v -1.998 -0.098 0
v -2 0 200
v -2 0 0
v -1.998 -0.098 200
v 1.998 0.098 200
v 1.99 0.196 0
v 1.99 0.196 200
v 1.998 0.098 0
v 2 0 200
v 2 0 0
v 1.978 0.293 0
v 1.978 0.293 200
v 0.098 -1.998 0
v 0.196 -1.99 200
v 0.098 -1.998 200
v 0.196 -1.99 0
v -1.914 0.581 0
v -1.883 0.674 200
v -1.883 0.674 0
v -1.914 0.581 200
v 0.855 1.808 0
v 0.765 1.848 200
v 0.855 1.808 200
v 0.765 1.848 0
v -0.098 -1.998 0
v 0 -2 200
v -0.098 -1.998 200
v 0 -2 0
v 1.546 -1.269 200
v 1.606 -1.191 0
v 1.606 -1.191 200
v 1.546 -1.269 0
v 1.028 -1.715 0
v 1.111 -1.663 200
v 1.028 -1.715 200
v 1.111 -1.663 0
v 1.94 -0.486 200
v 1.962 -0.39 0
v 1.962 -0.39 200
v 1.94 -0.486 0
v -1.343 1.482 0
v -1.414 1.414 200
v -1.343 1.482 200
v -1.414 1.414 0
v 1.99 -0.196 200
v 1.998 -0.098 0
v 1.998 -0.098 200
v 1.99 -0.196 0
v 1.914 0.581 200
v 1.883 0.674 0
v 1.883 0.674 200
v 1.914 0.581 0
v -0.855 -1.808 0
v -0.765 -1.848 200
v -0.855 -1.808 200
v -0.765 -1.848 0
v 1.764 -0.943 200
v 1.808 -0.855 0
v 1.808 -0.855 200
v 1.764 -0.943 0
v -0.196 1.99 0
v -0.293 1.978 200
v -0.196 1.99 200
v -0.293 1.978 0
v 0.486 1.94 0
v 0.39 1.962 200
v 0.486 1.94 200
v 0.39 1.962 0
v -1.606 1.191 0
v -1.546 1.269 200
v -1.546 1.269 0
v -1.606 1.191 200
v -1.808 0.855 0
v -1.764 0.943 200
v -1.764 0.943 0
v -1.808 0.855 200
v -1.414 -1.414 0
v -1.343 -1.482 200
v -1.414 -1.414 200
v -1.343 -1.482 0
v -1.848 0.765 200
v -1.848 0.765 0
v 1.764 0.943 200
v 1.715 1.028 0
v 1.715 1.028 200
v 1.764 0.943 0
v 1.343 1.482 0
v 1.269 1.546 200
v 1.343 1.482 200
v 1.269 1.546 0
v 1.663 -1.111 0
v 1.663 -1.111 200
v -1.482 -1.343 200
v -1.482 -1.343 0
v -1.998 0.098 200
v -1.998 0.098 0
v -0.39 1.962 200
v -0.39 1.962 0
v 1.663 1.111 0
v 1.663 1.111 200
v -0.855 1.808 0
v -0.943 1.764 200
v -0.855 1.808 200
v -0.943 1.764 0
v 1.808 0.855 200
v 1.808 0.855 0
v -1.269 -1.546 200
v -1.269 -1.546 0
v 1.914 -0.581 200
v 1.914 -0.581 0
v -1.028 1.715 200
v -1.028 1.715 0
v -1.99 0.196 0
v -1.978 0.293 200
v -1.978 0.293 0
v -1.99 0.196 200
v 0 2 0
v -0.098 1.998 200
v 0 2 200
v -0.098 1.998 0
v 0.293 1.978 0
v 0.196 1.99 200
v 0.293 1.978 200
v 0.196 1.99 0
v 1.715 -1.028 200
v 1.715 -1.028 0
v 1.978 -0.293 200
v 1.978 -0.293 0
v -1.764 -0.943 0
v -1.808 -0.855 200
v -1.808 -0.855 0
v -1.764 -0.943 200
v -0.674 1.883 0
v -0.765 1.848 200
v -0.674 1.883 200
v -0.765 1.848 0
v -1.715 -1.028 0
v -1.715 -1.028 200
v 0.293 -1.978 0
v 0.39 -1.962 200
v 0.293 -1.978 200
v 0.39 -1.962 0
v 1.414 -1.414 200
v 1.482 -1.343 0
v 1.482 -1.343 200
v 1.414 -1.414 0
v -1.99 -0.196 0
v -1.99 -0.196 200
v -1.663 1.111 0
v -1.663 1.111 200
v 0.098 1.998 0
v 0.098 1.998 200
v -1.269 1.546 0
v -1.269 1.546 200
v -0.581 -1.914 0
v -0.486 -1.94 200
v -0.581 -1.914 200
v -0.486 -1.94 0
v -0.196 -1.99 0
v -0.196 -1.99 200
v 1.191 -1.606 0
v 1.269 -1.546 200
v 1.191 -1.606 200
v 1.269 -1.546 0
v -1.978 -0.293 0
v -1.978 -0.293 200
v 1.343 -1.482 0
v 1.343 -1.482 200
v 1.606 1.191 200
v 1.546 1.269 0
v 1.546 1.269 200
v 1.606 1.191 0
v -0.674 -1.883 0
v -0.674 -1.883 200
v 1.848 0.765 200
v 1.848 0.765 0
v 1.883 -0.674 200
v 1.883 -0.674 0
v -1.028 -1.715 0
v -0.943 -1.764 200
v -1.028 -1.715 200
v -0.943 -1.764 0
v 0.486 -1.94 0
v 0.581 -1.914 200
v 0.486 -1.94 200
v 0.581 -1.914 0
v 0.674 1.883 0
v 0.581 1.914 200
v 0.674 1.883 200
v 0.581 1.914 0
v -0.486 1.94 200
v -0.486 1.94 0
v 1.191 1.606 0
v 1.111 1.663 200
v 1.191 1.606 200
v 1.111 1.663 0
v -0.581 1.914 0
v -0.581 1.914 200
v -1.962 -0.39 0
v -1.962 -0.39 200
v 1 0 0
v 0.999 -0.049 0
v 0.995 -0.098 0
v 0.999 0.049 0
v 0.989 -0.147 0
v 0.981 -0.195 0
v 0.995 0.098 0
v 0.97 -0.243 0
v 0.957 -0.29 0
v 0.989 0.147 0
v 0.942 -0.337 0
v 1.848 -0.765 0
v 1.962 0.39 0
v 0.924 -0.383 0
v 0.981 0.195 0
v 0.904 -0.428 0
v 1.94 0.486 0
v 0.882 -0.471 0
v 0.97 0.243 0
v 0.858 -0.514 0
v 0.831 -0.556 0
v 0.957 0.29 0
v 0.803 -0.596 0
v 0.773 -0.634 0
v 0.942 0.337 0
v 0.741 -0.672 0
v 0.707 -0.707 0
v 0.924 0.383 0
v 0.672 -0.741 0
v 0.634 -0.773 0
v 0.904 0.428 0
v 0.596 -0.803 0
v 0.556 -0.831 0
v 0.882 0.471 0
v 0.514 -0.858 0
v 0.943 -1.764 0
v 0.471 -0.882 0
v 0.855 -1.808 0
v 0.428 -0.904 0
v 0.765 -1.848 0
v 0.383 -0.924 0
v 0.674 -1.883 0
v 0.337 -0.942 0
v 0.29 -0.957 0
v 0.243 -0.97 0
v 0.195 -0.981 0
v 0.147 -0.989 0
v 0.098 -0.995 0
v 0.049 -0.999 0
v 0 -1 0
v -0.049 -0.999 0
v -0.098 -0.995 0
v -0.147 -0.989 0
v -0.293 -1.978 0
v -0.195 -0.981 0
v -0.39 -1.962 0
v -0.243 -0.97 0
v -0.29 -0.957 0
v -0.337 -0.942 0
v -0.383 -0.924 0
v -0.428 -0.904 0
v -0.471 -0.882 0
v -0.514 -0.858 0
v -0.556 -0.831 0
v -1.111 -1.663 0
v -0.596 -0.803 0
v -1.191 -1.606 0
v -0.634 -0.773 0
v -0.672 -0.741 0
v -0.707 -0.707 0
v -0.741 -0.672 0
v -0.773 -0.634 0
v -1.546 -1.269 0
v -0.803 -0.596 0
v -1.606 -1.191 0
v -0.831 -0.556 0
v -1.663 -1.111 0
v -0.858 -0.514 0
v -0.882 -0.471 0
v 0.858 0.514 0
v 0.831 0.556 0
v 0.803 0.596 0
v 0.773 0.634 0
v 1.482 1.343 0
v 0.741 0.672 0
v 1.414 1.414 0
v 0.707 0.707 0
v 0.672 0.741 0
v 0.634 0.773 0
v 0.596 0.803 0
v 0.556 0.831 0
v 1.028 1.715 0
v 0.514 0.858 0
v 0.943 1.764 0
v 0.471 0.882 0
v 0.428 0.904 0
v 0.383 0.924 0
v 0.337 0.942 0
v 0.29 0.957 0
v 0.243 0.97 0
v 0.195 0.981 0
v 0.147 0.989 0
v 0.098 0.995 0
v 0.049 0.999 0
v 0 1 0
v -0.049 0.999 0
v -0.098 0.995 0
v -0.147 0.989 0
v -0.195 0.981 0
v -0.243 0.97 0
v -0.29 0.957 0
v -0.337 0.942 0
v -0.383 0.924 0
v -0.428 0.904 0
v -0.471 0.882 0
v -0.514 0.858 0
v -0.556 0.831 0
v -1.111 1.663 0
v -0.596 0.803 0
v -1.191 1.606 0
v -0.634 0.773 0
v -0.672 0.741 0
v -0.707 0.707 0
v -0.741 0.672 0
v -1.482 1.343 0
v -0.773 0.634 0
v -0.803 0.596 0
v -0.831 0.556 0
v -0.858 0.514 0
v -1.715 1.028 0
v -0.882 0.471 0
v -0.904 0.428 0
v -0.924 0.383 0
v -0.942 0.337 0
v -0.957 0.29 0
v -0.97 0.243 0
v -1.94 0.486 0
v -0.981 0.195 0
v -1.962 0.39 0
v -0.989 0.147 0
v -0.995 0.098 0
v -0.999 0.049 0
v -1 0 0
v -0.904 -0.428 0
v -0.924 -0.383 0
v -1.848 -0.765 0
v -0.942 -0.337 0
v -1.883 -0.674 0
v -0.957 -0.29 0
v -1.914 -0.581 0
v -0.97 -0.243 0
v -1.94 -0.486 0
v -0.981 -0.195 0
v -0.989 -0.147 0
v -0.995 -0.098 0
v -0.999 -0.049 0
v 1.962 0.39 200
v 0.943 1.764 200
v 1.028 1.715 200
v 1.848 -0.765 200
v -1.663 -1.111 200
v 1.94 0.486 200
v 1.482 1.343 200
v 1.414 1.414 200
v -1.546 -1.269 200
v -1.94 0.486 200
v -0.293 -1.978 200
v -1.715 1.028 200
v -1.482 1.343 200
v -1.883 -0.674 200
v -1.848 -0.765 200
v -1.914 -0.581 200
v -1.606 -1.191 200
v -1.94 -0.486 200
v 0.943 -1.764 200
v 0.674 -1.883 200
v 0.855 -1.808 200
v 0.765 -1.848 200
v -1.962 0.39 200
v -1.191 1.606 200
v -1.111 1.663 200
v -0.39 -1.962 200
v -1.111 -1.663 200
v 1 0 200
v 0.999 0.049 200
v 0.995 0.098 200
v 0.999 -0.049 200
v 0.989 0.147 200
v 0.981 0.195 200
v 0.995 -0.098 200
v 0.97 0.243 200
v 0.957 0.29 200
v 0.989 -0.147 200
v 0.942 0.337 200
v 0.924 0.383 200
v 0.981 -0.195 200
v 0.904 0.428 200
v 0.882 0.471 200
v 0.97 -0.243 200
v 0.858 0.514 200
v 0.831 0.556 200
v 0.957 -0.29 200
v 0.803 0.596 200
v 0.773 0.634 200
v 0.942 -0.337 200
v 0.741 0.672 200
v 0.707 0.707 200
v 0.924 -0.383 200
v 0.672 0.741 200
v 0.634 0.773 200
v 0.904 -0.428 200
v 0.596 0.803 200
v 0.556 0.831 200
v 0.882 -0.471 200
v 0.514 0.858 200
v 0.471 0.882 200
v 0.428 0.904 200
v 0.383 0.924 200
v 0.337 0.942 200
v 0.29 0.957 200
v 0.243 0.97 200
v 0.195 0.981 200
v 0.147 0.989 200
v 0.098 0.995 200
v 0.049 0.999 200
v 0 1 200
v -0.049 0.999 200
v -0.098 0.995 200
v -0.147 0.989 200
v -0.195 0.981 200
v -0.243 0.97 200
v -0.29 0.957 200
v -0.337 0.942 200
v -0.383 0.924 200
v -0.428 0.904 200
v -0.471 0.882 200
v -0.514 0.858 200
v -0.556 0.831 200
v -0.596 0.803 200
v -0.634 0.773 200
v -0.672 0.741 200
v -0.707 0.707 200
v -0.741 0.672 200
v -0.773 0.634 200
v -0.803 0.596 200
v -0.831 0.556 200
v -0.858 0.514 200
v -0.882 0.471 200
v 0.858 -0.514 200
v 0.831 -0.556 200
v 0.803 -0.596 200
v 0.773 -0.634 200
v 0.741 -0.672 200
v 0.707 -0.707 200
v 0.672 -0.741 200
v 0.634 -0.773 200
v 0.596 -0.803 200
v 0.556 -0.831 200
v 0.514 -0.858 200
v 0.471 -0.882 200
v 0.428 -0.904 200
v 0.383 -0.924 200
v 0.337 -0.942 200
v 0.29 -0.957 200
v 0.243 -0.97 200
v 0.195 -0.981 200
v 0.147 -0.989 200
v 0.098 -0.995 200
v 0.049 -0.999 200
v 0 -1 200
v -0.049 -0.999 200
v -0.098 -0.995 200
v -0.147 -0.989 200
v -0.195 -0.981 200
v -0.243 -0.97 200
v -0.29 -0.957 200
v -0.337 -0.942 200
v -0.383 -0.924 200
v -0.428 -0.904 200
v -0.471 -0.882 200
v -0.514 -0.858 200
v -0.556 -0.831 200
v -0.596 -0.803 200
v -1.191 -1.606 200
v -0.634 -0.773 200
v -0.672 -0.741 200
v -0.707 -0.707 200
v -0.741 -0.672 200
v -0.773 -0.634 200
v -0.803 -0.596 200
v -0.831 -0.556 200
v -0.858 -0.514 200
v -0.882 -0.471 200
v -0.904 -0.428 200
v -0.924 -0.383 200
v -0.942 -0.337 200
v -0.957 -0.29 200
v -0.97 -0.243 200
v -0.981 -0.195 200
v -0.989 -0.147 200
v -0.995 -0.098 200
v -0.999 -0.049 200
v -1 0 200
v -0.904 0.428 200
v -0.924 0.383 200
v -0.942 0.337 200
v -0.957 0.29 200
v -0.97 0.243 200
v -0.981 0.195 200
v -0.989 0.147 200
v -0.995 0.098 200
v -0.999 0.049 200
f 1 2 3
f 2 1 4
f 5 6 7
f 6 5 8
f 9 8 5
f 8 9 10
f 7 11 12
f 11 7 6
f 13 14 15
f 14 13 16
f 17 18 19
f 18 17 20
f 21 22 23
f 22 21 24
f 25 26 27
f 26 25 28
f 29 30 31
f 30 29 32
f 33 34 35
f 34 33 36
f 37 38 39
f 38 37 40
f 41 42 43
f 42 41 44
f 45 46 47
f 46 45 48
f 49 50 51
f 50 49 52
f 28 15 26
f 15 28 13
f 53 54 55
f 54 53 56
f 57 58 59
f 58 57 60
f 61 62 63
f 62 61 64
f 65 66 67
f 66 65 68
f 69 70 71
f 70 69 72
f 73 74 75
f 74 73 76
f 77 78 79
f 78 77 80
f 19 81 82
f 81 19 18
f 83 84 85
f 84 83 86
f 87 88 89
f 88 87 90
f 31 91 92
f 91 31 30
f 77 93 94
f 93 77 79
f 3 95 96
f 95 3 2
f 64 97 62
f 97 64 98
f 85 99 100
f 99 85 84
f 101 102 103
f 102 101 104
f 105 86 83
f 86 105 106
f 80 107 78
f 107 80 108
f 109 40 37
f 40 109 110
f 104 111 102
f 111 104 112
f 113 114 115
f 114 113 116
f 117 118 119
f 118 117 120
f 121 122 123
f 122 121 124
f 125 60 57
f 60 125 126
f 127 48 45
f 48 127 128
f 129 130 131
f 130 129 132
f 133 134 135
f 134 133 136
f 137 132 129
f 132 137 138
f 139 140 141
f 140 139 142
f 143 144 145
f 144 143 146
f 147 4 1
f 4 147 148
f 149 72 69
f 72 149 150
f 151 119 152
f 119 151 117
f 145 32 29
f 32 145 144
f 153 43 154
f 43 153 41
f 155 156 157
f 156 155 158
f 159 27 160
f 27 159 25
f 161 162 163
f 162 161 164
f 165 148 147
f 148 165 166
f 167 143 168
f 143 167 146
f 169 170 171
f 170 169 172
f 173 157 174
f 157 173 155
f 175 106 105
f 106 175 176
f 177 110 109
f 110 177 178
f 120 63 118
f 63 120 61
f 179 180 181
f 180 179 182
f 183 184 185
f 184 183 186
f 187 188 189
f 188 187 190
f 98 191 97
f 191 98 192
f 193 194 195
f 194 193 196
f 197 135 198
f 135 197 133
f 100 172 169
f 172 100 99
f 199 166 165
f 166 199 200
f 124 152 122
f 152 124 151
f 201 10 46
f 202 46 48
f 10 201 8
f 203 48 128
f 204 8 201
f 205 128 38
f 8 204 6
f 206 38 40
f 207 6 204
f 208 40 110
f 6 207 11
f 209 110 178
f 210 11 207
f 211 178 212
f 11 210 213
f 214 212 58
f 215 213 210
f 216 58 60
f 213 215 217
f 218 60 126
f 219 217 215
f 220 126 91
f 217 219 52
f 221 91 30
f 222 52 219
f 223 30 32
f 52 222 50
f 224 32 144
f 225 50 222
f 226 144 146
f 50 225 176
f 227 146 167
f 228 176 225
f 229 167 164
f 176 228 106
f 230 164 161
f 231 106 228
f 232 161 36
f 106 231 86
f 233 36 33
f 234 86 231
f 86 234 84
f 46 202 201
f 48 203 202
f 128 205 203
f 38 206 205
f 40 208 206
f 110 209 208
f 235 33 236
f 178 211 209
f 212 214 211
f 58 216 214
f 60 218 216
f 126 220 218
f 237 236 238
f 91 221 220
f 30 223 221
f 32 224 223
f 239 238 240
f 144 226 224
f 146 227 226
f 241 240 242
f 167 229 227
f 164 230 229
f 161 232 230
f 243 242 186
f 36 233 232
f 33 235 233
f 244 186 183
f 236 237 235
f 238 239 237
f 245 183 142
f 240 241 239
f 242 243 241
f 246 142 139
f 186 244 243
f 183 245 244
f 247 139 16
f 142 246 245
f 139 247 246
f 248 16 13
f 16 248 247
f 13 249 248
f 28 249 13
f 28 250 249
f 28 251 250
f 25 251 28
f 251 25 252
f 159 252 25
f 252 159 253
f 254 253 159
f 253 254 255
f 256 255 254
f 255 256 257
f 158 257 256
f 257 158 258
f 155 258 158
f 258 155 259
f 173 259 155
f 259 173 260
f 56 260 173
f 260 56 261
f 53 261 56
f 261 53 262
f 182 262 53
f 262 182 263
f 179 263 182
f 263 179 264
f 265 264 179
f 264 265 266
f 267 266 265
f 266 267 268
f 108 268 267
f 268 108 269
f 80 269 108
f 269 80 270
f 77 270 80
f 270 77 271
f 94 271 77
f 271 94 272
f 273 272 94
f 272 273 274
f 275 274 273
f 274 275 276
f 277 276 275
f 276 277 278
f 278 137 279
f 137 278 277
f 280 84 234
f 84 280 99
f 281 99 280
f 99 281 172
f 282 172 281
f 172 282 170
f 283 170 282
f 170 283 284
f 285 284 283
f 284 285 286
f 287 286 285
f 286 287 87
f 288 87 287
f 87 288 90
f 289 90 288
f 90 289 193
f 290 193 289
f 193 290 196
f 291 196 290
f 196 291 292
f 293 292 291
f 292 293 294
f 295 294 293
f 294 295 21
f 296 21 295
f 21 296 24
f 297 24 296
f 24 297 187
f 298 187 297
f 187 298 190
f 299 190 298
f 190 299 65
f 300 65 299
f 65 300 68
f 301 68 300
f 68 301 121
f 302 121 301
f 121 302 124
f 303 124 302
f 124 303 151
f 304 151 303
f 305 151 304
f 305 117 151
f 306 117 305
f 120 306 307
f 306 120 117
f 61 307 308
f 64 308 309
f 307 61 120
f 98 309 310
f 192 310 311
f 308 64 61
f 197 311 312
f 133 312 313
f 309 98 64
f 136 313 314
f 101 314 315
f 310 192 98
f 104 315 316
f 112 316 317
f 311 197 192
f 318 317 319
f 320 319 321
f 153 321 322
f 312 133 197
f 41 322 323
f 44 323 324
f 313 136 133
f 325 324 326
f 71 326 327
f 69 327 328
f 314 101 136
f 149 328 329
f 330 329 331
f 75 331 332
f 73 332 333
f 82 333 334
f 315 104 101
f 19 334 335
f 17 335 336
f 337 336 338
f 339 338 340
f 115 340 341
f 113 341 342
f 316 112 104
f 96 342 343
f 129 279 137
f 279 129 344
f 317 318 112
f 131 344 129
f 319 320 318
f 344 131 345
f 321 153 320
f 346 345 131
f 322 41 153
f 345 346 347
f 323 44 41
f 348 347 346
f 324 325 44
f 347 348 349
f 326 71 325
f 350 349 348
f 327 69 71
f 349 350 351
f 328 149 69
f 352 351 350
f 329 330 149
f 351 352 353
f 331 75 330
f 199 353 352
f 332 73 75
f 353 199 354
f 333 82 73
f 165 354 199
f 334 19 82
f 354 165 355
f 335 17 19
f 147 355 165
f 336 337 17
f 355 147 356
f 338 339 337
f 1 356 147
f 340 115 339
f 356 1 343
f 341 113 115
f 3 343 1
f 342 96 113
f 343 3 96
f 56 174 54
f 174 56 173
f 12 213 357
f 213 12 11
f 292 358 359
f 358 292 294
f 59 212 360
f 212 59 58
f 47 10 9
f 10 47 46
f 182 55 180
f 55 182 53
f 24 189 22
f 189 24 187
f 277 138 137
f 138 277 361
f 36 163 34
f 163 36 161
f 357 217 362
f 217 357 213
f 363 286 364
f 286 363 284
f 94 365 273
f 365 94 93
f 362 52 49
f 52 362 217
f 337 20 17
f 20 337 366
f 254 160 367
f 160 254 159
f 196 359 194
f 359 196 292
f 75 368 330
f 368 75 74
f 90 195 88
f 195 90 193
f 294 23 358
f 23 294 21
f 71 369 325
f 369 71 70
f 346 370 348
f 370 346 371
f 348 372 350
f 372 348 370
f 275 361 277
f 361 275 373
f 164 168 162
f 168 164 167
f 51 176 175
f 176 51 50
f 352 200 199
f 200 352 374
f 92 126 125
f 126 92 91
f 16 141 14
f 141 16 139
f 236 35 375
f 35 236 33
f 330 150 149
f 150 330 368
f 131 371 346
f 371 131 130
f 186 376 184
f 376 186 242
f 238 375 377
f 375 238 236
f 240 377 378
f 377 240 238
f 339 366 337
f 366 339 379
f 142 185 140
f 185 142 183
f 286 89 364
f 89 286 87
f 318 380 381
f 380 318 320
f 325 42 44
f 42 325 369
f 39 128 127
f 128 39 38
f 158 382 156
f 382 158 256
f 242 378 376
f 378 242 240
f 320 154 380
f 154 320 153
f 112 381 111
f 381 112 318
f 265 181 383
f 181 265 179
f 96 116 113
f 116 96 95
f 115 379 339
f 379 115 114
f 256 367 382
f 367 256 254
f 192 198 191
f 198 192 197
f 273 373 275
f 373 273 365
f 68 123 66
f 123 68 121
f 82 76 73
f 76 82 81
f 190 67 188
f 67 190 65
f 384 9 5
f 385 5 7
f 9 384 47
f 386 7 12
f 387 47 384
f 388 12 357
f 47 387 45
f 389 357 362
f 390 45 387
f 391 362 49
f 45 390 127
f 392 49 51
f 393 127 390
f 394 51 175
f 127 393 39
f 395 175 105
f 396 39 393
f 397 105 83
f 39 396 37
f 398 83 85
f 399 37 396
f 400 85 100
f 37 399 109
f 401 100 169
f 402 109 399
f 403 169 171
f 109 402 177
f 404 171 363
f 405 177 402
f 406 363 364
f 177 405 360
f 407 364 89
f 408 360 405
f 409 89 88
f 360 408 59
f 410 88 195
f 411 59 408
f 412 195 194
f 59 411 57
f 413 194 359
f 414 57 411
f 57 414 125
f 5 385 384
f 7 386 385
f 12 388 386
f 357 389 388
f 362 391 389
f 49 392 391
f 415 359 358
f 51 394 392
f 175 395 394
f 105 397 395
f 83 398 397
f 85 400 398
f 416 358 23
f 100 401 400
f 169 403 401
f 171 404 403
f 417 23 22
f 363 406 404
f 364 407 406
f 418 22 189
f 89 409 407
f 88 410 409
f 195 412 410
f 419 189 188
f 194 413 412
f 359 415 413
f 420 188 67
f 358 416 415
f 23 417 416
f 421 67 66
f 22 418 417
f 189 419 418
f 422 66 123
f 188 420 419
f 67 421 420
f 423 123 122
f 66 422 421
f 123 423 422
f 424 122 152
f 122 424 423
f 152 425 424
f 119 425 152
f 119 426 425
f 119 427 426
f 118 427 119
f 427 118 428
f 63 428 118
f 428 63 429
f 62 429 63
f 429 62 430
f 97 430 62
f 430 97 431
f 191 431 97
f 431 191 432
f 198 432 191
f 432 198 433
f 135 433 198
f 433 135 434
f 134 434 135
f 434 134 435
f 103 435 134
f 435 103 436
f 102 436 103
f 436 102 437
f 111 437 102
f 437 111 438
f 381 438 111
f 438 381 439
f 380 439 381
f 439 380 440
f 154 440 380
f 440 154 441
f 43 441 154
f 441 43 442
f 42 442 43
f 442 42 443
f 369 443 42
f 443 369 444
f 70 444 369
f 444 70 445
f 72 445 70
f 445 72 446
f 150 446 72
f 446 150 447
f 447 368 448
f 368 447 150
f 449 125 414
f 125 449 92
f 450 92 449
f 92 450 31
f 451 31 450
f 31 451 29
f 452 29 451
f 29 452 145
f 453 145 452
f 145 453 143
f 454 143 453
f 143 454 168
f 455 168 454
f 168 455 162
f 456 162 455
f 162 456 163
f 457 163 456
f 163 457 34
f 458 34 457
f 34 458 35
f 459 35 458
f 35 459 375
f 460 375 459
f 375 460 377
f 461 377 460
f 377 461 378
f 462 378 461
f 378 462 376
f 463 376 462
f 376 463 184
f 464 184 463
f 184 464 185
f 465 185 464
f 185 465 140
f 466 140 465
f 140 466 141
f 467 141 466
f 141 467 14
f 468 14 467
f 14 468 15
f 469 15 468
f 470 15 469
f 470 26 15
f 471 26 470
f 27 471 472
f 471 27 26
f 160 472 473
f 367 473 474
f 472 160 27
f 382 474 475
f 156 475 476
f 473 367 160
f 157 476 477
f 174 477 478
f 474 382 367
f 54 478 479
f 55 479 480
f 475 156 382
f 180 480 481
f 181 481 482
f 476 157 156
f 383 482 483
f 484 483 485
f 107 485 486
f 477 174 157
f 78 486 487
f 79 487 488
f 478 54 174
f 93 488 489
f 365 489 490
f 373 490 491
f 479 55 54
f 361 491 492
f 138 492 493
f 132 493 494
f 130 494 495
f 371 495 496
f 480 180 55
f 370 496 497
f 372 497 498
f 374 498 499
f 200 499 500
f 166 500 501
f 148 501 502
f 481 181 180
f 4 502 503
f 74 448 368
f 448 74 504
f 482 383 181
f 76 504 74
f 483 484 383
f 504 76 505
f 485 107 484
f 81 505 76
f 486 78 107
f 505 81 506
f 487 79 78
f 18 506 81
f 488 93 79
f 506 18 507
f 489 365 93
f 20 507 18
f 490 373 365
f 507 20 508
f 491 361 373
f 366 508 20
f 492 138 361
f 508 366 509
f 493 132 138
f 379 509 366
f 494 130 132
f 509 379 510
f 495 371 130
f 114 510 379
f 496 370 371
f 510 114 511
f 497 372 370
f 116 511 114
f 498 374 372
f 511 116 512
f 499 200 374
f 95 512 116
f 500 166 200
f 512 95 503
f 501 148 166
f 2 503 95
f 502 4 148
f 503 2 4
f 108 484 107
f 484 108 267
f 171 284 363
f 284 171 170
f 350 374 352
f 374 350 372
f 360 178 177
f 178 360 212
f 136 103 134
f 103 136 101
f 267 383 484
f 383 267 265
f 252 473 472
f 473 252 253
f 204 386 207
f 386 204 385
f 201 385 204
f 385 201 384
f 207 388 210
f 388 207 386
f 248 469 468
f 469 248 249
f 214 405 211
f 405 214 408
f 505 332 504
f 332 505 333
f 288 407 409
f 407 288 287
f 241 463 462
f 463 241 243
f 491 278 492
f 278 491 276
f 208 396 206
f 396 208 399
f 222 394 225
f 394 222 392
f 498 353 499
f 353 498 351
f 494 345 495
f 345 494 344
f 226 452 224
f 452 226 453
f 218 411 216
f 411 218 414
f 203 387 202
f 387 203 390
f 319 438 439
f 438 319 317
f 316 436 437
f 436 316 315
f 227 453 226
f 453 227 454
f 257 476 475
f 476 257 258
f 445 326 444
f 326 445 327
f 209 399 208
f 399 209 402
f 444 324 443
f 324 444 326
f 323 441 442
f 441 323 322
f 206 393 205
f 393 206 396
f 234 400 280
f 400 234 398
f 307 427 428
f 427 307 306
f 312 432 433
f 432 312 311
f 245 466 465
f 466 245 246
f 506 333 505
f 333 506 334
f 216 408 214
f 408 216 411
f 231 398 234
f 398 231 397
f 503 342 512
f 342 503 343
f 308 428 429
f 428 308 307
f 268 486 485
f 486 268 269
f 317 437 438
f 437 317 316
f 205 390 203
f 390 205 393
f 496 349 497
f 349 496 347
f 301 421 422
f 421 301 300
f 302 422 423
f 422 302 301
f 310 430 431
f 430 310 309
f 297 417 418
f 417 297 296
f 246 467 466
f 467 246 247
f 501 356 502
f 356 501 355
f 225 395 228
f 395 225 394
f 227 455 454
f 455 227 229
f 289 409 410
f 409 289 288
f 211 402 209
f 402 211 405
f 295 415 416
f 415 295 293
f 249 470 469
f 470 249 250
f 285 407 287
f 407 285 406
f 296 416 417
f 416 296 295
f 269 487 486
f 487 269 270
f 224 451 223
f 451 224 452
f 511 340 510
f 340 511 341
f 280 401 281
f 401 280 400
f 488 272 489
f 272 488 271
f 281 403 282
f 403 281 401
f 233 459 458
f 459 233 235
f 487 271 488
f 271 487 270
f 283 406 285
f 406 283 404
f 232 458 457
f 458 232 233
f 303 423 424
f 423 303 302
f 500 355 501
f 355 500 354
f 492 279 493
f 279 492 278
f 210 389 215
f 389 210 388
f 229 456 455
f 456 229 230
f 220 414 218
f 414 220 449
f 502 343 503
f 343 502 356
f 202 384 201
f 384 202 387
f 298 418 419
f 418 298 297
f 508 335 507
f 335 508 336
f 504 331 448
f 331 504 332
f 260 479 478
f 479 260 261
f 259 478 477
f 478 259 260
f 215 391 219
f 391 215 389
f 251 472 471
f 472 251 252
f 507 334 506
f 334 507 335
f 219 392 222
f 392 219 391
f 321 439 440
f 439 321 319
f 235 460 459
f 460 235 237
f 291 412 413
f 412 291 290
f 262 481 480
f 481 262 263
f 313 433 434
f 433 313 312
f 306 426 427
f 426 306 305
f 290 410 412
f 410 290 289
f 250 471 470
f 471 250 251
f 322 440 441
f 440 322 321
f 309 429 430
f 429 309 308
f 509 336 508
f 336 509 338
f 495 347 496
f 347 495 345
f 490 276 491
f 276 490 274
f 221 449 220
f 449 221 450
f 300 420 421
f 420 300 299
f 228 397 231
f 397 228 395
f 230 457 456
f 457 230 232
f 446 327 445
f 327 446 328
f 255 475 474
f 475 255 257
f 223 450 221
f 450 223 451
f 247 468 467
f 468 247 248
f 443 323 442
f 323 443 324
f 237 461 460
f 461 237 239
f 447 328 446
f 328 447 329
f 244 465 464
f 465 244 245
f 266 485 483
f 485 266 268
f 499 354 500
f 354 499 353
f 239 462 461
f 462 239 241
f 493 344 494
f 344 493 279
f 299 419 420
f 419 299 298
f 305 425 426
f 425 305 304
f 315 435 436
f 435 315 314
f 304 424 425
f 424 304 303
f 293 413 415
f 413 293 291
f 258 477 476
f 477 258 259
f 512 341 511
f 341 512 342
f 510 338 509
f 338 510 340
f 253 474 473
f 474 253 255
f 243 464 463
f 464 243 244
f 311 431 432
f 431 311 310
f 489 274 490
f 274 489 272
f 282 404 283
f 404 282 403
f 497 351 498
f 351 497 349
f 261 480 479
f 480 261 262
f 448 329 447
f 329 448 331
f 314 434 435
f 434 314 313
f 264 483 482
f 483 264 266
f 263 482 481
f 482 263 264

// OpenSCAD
$fn = 128;

// PTFE tubing (generic)
outer_d = 4.0;     // mm
inner_d = 2.0;     // mm
length  = 200.0;   // mm

module ptfe_tube(od, id, len) {
    difference() {
        cylinder(h = len, d = od, center = false);
        translate([0,0,-0.1])
            cylinder(h = len + 0.2, d = id, center = false);
    }
}

ptfe_tube(outer_d, inner_d, length);
